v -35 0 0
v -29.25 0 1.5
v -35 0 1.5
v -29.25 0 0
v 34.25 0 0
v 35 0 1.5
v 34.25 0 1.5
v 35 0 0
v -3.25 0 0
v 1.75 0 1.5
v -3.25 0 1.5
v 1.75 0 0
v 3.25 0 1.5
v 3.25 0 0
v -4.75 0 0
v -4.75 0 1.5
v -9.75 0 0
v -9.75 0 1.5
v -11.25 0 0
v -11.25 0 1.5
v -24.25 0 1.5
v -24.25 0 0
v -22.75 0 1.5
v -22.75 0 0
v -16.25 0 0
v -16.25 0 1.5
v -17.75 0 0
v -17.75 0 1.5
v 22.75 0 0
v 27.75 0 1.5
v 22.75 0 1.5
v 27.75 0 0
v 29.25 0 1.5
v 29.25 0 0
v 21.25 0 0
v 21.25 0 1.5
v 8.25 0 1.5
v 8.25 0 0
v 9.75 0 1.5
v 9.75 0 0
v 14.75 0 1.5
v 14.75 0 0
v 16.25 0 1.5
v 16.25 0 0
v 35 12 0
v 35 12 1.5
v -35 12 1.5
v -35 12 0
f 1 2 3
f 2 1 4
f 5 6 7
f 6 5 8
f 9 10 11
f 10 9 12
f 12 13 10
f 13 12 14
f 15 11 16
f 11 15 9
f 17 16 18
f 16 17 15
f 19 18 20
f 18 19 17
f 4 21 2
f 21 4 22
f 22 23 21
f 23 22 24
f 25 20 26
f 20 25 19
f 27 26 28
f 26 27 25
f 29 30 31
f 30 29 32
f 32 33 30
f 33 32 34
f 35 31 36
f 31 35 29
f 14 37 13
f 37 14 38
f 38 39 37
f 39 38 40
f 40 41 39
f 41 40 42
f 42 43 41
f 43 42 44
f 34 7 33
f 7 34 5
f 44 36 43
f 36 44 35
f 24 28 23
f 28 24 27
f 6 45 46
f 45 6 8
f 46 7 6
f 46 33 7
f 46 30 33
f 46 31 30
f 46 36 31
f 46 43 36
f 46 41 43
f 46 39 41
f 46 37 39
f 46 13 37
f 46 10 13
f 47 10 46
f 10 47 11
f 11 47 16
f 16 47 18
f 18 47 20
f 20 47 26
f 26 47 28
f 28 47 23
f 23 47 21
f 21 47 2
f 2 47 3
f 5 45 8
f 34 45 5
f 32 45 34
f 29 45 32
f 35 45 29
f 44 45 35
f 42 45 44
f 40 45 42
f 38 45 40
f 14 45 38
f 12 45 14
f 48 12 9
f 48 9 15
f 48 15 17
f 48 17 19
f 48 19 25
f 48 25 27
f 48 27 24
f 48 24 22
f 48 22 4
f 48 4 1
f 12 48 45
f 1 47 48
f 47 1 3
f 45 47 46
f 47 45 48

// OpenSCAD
// 10-well comb for agarose gel casting, printed lying flat
// Units: mm

// ---- Spine ----
spine_len   = 70;   // spine length (X)
spine_wid   = 12;   // spine width (Y)
plate_thk   = 1.5;  // plate thickness (Z)

// ---- Teeth ----
tooth_count = 10;   // number of teeth
tooth_w     = 5.0;  // tooth width (X)
tooth_l     = 12;   // tooth length (Y)
tooth_h     = 12;   // tooth height from spine (-Y)

// ---- Misc ----
eps         = 0.5;  // cutter overshoot
$fn         = 64;

// Pitch between tooth centres
pitch = tooth_w + 1.5;

difference() {
    // Base plate
    translate([-spine_len/2, 0, 0])
        cube([spine_len, spine_wid, plate_thk]);

    // Teeth row, centred on spine
    for (i = [0 : tooth_count - 1]) {
        x = (i - (tooth_count - 1)/2) * pitch;
        translate([x, -tooth_h, 0])
            cube([tooth_w, tooth_l, plate_thk + eps]);
    }
}
